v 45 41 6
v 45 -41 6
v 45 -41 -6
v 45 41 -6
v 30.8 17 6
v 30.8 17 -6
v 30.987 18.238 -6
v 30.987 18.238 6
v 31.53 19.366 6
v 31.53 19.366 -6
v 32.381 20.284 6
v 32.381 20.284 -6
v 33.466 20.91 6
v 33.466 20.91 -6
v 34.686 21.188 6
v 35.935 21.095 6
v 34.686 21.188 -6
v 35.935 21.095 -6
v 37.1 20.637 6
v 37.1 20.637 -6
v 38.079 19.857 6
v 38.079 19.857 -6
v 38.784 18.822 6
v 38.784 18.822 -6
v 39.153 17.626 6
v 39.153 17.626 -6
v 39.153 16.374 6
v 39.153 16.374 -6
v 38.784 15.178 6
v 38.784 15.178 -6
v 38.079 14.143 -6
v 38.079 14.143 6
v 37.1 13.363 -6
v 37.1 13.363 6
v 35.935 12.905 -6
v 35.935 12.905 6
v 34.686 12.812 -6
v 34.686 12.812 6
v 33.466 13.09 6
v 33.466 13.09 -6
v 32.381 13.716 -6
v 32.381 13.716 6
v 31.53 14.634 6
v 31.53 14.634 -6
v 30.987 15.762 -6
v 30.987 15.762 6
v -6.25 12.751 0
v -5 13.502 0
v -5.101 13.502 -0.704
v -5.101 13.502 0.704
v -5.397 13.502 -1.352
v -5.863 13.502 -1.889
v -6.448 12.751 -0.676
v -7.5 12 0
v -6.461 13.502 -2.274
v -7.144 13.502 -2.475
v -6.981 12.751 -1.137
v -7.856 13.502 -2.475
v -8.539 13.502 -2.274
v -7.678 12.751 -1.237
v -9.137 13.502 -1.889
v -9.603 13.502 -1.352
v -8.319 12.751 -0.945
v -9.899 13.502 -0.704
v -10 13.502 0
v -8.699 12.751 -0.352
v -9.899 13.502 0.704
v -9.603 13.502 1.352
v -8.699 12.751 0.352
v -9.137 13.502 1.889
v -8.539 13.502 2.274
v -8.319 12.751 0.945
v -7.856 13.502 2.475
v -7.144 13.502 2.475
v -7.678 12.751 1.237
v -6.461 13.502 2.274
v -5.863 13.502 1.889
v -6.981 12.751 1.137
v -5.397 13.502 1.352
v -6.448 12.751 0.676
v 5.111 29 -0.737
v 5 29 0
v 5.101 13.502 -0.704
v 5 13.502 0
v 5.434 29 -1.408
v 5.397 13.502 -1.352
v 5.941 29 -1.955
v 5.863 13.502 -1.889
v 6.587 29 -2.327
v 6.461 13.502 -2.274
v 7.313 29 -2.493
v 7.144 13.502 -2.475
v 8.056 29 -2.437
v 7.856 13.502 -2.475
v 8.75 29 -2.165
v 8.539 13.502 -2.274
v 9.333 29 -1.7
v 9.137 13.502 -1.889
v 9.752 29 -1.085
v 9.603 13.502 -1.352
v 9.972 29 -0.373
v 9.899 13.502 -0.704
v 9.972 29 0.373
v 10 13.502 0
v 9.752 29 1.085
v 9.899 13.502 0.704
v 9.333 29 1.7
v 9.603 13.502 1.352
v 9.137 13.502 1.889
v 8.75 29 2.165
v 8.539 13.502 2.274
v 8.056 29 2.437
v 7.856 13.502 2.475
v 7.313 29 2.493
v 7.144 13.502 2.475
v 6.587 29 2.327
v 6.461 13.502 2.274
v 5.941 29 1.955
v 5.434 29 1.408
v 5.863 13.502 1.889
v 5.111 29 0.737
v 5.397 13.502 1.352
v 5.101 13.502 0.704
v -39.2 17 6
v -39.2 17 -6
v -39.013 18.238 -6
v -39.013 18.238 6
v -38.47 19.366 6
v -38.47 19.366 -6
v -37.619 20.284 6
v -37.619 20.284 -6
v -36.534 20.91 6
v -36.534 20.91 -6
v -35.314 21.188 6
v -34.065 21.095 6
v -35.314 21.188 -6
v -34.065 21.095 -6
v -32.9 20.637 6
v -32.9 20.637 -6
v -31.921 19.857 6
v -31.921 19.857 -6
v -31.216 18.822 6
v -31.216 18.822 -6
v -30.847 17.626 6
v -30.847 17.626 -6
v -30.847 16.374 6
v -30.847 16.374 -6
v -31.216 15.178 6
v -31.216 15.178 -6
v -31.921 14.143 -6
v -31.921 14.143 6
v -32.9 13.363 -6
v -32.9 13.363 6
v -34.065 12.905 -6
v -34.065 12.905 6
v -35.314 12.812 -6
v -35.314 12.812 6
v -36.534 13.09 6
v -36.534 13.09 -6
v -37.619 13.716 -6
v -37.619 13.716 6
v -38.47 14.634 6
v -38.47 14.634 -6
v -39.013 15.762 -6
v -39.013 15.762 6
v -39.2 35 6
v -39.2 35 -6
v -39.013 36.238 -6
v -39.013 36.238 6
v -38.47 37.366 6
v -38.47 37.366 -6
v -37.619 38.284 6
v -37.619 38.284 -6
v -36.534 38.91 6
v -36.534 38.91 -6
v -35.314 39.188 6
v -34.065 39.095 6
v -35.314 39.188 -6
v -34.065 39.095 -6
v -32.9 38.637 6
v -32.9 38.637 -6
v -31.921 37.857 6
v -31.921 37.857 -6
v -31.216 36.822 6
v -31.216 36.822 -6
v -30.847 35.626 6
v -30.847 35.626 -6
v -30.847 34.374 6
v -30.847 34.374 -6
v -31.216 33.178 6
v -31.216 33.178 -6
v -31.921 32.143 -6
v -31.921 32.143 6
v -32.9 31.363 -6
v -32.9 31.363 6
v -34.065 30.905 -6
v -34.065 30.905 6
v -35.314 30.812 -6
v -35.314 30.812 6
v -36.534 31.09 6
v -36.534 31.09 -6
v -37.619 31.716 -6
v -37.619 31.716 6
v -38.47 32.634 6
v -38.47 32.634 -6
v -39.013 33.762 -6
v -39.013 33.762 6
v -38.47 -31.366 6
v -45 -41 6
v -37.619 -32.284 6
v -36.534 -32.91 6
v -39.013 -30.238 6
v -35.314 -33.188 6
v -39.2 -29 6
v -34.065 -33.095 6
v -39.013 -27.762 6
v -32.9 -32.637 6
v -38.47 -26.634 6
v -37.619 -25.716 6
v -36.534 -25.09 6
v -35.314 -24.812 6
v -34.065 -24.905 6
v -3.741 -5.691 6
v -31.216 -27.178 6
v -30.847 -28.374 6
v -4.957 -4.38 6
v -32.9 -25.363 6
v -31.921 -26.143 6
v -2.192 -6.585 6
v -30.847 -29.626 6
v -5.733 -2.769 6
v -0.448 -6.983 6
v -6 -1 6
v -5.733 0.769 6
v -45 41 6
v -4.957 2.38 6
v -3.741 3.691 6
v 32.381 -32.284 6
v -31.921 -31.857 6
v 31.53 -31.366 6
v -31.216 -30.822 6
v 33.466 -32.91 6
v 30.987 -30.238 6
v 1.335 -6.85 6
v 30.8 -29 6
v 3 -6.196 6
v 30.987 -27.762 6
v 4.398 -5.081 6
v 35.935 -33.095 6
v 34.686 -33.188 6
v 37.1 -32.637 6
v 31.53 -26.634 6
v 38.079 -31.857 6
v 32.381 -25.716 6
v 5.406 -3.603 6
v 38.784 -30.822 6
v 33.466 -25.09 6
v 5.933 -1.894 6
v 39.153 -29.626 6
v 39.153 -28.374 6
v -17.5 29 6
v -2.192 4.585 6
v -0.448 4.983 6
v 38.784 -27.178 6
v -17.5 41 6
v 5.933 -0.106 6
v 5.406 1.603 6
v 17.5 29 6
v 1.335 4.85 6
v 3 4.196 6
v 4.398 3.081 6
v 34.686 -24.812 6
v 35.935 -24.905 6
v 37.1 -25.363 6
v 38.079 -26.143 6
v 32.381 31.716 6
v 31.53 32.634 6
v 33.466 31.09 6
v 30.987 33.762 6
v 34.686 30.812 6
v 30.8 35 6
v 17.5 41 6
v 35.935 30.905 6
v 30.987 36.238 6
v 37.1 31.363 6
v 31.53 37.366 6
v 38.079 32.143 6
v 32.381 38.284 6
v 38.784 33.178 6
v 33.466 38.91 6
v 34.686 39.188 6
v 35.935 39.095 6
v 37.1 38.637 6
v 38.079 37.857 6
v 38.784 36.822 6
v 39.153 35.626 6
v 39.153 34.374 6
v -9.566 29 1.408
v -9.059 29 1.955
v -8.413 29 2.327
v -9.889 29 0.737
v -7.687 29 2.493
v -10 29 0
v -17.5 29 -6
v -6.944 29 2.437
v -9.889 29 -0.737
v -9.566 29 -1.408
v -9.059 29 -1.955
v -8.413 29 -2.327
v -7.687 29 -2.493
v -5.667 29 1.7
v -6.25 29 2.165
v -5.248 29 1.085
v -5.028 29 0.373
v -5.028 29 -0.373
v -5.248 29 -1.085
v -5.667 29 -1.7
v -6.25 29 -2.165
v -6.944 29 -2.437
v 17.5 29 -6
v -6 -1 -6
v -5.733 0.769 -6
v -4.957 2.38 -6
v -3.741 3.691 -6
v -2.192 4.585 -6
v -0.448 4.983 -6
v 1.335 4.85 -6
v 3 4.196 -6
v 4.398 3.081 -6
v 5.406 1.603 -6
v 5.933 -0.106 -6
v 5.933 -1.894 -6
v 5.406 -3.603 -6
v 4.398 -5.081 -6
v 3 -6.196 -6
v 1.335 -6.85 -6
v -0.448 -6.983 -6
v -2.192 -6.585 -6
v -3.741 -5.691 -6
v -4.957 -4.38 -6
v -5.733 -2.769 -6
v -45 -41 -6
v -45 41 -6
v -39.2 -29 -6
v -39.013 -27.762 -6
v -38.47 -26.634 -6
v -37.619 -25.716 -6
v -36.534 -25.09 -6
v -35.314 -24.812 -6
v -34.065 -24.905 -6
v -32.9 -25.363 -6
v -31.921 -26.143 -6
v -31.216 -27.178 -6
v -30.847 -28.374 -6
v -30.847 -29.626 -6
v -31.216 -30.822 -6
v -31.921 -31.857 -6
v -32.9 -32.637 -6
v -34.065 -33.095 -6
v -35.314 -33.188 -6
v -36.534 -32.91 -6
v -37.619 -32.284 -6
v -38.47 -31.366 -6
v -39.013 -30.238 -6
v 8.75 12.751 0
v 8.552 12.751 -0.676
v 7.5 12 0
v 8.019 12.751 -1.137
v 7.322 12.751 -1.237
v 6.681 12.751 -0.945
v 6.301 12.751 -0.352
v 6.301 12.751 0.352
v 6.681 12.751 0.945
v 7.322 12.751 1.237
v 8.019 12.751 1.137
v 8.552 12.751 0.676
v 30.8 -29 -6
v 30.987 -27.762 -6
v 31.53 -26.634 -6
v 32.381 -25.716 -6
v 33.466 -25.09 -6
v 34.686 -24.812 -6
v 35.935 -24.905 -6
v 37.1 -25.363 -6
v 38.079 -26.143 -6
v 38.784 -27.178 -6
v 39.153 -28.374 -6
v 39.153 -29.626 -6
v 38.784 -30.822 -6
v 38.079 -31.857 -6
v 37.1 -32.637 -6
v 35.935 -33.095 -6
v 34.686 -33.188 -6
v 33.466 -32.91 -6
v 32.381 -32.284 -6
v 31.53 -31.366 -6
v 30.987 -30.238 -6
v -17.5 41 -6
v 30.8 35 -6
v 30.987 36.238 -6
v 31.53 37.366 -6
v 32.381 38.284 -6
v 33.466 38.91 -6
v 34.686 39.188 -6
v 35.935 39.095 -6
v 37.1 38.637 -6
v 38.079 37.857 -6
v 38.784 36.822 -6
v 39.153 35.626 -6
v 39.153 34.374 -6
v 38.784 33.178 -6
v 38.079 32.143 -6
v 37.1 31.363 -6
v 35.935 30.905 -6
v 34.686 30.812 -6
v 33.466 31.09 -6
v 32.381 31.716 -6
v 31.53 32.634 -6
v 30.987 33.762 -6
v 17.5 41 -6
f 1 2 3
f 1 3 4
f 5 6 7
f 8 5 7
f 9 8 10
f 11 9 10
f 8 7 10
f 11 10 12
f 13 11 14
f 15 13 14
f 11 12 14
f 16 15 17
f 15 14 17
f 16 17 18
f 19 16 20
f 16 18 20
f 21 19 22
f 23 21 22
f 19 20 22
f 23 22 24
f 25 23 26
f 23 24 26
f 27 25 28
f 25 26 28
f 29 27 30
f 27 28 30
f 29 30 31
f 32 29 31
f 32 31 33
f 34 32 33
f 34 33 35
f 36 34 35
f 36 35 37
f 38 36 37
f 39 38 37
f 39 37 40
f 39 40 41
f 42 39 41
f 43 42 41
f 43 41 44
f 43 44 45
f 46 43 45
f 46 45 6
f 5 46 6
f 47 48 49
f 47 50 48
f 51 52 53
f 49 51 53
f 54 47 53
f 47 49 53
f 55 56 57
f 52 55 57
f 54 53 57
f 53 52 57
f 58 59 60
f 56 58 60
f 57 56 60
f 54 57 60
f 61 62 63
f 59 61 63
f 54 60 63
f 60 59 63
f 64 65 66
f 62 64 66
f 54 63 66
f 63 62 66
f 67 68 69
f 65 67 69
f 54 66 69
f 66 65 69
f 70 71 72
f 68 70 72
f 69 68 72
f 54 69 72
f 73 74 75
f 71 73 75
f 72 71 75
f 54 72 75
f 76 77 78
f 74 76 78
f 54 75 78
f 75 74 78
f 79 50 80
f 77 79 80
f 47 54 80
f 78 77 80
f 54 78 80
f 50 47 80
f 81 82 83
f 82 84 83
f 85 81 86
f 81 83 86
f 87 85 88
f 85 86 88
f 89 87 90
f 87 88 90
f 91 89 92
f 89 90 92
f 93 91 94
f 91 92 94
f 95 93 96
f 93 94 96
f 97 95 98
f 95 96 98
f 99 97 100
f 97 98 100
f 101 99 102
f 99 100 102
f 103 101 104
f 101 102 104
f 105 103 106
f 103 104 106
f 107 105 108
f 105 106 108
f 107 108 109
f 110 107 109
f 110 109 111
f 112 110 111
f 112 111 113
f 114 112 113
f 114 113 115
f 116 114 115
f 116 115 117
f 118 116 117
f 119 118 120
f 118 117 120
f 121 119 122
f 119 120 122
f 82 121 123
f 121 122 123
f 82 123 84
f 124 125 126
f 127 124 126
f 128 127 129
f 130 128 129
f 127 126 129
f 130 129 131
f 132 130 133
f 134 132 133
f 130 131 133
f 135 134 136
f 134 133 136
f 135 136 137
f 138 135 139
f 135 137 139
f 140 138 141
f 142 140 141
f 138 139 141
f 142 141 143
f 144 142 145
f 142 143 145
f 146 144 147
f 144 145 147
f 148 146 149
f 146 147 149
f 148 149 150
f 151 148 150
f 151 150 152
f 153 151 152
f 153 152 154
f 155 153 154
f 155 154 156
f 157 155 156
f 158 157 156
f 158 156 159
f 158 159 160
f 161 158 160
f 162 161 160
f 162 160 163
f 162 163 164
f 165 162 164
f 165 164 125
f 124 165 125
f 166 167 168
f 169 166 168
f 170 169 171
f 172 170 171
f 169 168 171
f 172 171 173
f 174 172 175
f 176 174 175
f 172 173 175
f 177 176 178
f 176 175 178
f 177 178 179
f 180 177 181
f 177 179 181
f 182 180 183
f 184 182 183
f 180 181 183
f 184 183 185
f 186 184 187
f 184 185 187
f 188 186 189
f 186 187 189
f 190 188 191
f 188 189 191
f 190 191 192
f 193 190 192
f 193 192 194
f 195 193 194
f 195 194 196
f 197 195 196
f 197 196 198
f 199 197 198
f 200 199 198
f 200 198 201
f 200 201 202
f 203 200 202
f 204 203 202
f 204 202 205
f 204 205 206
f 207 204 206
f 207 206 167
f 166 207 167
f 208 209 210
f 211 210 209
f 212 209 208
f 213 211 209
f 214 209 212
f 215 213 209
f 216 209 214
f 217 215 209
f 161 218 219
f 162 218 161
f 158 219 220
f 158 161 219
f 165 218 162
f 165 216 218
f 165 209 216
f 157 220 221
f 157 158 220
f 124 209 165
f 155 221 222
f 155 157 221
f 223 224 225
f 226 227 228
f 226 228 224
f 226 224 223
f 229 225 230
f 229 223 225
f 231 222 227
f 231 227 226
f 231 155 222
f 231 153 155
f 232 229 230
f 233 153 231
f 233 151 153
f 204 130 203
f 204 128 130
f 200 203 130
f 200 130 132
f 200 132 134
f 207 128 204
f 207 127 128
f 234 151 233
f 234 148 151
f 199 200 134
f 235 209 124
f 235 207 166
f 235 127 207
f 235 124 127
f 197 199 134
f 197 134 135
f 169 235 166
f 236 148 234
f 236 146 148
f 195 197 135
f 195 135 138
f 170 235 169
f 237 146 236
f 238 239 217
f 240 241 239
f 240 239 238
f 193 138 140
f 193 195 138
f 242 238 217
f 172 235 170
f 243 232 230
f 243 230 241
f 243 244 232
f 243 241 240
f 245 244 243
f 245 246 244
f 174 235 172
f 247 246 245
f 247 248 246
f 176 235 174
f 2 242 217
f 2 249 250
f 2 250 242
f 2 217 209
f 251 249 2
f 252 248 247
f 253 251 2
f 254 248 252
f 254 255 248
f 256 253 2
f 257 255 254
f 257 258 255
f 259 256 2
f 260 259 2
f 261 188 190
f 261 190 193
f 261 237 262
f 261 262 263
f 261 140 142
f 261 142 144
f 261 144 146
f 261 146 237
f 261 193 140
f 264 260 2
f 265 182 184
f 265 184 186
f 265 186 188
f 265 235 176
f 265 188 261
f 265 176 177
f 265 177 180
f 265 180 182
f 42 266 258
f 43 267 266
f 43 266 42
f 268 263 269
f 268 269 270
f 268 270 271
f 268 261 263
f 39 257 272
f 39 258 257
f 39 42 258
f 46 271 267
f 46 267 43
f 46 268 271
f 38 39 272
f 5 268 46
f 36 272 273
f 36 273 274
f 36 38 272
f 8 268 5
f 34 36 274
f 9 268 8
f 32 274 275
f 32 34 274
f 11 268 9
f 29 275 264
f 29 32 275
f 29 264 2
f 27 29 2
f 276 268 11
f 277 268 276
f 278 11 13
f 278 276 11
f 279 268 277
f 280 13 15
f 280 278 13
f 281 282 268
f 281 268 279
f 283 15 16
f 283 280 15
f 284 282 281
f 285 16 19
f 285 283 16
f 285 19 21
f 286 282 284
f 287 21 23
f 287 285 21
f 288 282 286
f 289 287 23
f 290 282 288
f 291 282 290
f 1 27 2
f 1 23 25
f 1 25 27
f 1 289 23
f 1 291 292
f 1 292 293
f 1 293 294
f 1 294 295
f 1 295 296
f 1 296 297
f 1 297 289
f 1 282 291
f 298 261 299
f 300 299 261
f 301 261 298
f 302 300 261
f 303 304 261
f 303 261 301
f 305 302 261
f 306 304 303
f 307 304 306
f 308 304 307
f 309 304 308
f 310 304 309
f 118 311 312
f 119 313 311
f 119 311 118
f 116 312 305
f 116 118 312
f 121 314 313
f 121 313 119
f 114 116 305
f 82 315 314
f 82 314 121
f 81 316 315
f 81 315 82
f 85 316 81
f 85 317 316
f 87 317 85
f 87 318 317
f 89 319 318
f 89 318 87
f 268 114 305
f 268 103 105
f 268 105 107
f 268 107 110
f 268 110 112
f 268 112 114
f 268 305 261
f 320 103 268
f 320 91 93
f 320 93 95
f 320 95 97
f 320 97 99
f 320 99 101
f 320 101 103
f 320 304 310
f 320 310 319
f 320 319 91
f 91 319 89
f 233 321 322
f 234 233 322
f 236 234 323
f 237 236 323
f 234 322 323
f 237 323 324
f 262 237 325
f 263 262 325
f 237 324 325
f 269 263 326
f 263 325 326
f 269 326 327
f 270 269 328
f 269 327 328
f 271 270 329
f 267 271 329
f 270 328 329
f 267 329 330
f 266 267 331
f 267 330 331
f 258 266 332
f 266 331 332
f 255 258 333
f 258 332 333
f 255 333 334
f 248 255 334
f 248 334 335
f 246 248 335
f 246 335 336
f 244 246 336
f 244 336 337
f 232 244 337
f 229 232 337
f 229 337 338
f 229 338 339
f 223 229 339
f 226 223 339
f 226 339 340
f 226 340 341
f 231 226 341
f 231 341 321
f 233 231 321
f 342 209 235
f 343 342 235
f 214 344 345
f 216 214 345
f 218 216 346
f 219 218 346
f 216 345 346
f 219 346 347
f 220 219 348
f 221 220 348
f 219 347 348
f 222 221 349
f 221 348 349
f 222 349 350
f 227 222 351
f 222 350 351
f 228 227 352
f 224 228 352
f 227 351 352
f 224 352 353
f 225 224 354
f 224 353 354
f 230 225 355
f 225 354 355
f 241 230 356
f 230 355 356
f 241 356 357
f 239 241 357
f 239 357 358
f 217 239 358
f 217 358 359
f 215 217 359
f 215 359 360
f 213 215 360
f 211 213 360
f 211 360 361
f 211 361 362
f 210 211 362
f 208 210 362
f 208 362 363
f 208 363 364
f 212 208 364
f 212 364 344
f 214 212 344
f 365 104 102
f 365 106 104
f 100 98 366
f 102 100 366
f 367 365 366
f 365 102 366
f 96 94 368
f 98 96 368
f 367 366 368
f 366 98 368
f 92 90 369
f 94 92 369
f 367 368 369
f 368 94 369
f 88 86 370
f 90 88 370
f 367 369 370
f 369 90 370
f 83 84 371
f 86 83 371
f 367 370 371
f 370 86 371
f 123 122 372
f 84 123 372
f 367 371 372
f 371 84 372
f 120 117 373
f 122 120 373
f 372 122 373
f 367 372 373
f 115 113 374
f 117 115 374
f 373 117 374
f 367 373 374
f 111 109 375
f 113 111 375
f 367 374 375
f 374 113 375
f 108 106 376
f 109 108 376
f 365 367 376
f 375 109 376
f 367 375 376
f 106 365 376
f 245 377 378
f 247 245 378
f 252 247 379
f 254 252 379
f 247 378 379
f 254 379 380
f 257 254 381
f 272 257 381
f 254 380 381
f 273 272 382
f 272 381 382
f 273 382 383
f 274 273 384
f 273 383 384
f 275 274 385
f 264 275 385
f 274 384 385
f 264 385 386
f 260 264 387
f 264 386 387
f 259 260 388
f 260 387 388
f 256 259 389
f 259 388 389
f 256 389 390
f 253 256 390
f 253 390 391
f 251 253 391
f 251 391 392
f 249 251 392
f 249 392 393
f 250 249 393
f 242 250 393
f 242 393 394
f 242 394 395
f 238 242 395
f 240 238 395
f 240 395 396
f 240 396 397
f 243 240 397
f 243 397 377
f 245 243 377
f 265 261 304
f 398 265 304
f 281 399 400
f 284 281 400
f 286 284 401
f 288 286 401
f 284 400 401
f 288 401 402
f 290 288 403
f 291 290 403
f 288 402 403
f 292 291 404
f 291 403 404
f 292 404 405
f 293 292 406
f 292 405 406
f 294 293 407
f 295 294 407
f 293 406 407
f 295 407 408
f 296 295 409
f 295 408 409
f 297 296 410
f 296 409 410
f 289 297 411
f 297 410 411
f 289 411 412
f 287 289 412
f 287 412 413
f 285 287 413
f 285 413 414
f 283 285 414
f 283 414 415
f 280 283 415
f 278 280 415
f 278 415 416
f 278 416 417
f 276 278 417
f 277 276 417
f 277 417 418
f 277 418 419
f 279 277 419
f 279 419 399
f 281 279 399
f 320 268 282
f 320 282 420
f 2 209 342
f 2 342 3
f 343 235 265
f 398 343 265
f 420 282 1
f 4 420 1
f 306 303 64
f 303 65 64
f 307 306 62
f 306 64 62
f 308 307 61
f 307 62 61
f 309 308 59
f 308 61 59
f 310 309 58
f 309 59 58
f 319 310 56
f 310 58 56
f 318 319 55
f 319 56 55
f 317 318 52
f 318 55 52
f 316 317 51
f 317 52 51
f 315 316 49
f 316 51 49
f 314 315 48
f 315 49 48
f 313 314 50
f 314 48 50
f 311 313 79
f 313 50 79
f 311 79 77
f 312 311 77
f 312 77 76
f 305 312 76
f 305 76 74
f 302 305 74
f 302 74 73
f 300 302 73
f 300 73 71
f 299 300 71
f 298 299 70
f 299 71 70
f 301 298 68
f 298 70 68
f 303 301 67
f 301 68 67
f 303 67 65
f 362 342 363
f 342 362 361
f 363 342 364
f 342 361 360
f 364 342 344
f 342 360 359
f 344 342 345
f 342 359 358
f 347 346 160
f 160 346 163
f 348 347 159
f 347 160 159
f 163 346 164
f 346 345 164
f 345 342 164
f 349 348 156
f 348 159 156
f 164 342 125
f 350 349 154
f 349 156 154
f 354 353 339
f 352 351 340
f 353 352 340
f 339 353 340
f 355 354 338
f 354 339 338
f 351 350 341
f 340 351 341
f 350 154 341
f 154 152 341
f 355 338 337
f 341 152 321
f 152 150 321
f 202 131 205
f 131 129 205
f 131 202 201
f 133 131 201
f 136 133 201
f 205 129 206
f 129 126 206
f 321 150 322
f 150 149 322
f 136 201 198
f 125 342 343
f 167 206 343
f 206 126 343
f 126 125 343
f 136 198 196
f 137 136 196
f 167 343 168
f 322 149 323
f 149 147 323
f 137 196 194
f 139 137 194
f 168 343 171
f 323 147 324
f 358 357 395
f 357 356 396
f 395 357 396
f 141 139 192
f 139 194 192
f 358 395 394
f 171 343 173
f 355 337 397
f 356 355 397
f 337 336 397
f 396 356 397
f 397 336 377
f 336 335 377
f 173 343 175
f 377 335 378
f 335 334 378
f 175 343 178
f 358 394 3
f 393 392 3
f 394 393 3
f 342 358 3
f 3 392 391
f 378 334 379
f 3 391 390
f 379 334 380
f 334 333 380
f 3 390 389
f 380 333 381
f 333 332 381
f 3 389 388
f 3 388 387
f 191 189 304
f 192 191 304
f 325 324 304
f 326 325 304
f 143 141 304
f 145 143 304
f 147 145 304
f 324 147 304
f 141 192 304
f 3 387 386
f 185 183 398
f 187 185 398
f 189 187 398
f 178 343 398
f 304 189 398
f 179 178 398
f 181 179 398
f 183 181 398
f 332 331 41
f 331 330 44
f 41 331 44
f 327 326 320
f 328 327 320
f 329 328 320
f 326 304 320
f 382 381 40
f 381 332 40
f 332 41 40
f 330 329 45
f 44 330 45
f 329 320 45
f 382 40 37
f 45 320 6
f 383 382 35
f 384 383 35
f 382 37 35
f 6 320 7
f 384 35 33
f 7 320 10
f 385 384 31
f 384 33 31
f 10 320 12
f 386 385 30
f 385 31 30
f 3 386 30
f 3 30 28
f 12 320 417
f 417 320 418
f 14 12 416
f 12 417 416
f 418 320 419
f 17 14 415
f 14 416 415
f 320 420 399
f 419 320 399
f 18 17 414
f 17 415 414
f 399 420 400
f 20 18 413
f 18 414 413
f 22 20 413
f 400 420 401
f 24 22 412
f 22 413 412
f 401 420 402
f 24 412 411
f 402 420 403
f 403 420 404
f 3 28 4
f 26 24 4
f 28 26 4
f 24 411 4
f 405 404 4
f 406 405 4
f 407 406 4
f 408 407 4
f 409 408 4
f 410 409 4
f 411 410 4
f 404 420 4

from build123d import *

# Parameters (mm, degrees)
SKETCH1_W                  = 90
SKETCH1_H                  = 82
BOSS_EXTRUDE1_DEPTH        = 6
M8_CLEARANCE_HOLE1_D       = 8.4
CUT_EXTRUDE1_DEPTH         = 94.728330829
CUT_EXTRUDE1_DEPTH_BACK    = 12
SKETCH6_W                  = 35
SKETCH6_H                  = 12
F_12_0_12_DIAMETER_HOLE1_D = 12
M6_TAPPED_HOLE1_D          = 5
M6_TAPPED_HOLE1_DEPTH      = 15.497848452
M6_TAPPED_HOLE1_TIP        = 1.502151548


with BuildPart() as part:
    # Sketch1 → Boss-Extrude1 (new, symmetric)
    with BuildSketch(Plane.XY):
        Rectangle(SKETCH1_W, SKETCH1_H)
    extrude(amount=BOSS_EXTRUDE1_DEPTH, both=True)

    # M8 Clearance Hole1 (through all)
    with Locations(Plane.XY.offset(6)):
        with Locations((-35, 17), (35, 17), (35, -29), (-35, -29), (-35, 35), (35, 35)):
            Hole(M8_CLEARANCE_HOLE1_D / 2)

    # Sketch6 → Cut-Extrude1 (cut, two sides: drawn at the far end of the back side and taken through both)
    with BuildSketch(Plane(origin=(0, 41, 0), x_dir=(1, 0, 0), z_dir=(0, 1, 0)).offset(-CUT_EXTRUDE1_DEPTH_BACK)):
        Rectangle(SKETCH6_W, SKETCH6_H)
    extrude(amount=CUT_EXTRUDE1_DEPTH + CUT_EXTRUDE1_DEPTH_BACK, mode=Mode.SUBTRACT)

    # Ø12.0 (12) Diameter Hole1 (through all)
    with Locations(Plane.XY.offset(6)):
        with Locations((0, -1)):
            Hole(F_12_0_12_DIAMETER_HOLE1_D / 2)

    # M6 Tapped Hole1
    with Locations(Plane(origin=(0, 29, 0), x_dir=(1, 0, 0), z_dir=(0, 1, 0))):
        with Locations((-7.5, 0), (7.5, 0)):
            Hole(M6_TAPPED_HOLE1_D / 2, depth=M6_TAPPED_HOLE1_DEPTH)
            with Locations((0, 0, -(M6_TAPPED_HOLE1_DEPTH + M6_TAPPED_HOLE1_TIP / 2))):  # 118° drill point
                Cone(0, M6_TAPPED_HOLE1_D / 2, M6_TAPPED_HOLE1_TIP, mode=Mode.SUBTRACT)


solid = part.part
